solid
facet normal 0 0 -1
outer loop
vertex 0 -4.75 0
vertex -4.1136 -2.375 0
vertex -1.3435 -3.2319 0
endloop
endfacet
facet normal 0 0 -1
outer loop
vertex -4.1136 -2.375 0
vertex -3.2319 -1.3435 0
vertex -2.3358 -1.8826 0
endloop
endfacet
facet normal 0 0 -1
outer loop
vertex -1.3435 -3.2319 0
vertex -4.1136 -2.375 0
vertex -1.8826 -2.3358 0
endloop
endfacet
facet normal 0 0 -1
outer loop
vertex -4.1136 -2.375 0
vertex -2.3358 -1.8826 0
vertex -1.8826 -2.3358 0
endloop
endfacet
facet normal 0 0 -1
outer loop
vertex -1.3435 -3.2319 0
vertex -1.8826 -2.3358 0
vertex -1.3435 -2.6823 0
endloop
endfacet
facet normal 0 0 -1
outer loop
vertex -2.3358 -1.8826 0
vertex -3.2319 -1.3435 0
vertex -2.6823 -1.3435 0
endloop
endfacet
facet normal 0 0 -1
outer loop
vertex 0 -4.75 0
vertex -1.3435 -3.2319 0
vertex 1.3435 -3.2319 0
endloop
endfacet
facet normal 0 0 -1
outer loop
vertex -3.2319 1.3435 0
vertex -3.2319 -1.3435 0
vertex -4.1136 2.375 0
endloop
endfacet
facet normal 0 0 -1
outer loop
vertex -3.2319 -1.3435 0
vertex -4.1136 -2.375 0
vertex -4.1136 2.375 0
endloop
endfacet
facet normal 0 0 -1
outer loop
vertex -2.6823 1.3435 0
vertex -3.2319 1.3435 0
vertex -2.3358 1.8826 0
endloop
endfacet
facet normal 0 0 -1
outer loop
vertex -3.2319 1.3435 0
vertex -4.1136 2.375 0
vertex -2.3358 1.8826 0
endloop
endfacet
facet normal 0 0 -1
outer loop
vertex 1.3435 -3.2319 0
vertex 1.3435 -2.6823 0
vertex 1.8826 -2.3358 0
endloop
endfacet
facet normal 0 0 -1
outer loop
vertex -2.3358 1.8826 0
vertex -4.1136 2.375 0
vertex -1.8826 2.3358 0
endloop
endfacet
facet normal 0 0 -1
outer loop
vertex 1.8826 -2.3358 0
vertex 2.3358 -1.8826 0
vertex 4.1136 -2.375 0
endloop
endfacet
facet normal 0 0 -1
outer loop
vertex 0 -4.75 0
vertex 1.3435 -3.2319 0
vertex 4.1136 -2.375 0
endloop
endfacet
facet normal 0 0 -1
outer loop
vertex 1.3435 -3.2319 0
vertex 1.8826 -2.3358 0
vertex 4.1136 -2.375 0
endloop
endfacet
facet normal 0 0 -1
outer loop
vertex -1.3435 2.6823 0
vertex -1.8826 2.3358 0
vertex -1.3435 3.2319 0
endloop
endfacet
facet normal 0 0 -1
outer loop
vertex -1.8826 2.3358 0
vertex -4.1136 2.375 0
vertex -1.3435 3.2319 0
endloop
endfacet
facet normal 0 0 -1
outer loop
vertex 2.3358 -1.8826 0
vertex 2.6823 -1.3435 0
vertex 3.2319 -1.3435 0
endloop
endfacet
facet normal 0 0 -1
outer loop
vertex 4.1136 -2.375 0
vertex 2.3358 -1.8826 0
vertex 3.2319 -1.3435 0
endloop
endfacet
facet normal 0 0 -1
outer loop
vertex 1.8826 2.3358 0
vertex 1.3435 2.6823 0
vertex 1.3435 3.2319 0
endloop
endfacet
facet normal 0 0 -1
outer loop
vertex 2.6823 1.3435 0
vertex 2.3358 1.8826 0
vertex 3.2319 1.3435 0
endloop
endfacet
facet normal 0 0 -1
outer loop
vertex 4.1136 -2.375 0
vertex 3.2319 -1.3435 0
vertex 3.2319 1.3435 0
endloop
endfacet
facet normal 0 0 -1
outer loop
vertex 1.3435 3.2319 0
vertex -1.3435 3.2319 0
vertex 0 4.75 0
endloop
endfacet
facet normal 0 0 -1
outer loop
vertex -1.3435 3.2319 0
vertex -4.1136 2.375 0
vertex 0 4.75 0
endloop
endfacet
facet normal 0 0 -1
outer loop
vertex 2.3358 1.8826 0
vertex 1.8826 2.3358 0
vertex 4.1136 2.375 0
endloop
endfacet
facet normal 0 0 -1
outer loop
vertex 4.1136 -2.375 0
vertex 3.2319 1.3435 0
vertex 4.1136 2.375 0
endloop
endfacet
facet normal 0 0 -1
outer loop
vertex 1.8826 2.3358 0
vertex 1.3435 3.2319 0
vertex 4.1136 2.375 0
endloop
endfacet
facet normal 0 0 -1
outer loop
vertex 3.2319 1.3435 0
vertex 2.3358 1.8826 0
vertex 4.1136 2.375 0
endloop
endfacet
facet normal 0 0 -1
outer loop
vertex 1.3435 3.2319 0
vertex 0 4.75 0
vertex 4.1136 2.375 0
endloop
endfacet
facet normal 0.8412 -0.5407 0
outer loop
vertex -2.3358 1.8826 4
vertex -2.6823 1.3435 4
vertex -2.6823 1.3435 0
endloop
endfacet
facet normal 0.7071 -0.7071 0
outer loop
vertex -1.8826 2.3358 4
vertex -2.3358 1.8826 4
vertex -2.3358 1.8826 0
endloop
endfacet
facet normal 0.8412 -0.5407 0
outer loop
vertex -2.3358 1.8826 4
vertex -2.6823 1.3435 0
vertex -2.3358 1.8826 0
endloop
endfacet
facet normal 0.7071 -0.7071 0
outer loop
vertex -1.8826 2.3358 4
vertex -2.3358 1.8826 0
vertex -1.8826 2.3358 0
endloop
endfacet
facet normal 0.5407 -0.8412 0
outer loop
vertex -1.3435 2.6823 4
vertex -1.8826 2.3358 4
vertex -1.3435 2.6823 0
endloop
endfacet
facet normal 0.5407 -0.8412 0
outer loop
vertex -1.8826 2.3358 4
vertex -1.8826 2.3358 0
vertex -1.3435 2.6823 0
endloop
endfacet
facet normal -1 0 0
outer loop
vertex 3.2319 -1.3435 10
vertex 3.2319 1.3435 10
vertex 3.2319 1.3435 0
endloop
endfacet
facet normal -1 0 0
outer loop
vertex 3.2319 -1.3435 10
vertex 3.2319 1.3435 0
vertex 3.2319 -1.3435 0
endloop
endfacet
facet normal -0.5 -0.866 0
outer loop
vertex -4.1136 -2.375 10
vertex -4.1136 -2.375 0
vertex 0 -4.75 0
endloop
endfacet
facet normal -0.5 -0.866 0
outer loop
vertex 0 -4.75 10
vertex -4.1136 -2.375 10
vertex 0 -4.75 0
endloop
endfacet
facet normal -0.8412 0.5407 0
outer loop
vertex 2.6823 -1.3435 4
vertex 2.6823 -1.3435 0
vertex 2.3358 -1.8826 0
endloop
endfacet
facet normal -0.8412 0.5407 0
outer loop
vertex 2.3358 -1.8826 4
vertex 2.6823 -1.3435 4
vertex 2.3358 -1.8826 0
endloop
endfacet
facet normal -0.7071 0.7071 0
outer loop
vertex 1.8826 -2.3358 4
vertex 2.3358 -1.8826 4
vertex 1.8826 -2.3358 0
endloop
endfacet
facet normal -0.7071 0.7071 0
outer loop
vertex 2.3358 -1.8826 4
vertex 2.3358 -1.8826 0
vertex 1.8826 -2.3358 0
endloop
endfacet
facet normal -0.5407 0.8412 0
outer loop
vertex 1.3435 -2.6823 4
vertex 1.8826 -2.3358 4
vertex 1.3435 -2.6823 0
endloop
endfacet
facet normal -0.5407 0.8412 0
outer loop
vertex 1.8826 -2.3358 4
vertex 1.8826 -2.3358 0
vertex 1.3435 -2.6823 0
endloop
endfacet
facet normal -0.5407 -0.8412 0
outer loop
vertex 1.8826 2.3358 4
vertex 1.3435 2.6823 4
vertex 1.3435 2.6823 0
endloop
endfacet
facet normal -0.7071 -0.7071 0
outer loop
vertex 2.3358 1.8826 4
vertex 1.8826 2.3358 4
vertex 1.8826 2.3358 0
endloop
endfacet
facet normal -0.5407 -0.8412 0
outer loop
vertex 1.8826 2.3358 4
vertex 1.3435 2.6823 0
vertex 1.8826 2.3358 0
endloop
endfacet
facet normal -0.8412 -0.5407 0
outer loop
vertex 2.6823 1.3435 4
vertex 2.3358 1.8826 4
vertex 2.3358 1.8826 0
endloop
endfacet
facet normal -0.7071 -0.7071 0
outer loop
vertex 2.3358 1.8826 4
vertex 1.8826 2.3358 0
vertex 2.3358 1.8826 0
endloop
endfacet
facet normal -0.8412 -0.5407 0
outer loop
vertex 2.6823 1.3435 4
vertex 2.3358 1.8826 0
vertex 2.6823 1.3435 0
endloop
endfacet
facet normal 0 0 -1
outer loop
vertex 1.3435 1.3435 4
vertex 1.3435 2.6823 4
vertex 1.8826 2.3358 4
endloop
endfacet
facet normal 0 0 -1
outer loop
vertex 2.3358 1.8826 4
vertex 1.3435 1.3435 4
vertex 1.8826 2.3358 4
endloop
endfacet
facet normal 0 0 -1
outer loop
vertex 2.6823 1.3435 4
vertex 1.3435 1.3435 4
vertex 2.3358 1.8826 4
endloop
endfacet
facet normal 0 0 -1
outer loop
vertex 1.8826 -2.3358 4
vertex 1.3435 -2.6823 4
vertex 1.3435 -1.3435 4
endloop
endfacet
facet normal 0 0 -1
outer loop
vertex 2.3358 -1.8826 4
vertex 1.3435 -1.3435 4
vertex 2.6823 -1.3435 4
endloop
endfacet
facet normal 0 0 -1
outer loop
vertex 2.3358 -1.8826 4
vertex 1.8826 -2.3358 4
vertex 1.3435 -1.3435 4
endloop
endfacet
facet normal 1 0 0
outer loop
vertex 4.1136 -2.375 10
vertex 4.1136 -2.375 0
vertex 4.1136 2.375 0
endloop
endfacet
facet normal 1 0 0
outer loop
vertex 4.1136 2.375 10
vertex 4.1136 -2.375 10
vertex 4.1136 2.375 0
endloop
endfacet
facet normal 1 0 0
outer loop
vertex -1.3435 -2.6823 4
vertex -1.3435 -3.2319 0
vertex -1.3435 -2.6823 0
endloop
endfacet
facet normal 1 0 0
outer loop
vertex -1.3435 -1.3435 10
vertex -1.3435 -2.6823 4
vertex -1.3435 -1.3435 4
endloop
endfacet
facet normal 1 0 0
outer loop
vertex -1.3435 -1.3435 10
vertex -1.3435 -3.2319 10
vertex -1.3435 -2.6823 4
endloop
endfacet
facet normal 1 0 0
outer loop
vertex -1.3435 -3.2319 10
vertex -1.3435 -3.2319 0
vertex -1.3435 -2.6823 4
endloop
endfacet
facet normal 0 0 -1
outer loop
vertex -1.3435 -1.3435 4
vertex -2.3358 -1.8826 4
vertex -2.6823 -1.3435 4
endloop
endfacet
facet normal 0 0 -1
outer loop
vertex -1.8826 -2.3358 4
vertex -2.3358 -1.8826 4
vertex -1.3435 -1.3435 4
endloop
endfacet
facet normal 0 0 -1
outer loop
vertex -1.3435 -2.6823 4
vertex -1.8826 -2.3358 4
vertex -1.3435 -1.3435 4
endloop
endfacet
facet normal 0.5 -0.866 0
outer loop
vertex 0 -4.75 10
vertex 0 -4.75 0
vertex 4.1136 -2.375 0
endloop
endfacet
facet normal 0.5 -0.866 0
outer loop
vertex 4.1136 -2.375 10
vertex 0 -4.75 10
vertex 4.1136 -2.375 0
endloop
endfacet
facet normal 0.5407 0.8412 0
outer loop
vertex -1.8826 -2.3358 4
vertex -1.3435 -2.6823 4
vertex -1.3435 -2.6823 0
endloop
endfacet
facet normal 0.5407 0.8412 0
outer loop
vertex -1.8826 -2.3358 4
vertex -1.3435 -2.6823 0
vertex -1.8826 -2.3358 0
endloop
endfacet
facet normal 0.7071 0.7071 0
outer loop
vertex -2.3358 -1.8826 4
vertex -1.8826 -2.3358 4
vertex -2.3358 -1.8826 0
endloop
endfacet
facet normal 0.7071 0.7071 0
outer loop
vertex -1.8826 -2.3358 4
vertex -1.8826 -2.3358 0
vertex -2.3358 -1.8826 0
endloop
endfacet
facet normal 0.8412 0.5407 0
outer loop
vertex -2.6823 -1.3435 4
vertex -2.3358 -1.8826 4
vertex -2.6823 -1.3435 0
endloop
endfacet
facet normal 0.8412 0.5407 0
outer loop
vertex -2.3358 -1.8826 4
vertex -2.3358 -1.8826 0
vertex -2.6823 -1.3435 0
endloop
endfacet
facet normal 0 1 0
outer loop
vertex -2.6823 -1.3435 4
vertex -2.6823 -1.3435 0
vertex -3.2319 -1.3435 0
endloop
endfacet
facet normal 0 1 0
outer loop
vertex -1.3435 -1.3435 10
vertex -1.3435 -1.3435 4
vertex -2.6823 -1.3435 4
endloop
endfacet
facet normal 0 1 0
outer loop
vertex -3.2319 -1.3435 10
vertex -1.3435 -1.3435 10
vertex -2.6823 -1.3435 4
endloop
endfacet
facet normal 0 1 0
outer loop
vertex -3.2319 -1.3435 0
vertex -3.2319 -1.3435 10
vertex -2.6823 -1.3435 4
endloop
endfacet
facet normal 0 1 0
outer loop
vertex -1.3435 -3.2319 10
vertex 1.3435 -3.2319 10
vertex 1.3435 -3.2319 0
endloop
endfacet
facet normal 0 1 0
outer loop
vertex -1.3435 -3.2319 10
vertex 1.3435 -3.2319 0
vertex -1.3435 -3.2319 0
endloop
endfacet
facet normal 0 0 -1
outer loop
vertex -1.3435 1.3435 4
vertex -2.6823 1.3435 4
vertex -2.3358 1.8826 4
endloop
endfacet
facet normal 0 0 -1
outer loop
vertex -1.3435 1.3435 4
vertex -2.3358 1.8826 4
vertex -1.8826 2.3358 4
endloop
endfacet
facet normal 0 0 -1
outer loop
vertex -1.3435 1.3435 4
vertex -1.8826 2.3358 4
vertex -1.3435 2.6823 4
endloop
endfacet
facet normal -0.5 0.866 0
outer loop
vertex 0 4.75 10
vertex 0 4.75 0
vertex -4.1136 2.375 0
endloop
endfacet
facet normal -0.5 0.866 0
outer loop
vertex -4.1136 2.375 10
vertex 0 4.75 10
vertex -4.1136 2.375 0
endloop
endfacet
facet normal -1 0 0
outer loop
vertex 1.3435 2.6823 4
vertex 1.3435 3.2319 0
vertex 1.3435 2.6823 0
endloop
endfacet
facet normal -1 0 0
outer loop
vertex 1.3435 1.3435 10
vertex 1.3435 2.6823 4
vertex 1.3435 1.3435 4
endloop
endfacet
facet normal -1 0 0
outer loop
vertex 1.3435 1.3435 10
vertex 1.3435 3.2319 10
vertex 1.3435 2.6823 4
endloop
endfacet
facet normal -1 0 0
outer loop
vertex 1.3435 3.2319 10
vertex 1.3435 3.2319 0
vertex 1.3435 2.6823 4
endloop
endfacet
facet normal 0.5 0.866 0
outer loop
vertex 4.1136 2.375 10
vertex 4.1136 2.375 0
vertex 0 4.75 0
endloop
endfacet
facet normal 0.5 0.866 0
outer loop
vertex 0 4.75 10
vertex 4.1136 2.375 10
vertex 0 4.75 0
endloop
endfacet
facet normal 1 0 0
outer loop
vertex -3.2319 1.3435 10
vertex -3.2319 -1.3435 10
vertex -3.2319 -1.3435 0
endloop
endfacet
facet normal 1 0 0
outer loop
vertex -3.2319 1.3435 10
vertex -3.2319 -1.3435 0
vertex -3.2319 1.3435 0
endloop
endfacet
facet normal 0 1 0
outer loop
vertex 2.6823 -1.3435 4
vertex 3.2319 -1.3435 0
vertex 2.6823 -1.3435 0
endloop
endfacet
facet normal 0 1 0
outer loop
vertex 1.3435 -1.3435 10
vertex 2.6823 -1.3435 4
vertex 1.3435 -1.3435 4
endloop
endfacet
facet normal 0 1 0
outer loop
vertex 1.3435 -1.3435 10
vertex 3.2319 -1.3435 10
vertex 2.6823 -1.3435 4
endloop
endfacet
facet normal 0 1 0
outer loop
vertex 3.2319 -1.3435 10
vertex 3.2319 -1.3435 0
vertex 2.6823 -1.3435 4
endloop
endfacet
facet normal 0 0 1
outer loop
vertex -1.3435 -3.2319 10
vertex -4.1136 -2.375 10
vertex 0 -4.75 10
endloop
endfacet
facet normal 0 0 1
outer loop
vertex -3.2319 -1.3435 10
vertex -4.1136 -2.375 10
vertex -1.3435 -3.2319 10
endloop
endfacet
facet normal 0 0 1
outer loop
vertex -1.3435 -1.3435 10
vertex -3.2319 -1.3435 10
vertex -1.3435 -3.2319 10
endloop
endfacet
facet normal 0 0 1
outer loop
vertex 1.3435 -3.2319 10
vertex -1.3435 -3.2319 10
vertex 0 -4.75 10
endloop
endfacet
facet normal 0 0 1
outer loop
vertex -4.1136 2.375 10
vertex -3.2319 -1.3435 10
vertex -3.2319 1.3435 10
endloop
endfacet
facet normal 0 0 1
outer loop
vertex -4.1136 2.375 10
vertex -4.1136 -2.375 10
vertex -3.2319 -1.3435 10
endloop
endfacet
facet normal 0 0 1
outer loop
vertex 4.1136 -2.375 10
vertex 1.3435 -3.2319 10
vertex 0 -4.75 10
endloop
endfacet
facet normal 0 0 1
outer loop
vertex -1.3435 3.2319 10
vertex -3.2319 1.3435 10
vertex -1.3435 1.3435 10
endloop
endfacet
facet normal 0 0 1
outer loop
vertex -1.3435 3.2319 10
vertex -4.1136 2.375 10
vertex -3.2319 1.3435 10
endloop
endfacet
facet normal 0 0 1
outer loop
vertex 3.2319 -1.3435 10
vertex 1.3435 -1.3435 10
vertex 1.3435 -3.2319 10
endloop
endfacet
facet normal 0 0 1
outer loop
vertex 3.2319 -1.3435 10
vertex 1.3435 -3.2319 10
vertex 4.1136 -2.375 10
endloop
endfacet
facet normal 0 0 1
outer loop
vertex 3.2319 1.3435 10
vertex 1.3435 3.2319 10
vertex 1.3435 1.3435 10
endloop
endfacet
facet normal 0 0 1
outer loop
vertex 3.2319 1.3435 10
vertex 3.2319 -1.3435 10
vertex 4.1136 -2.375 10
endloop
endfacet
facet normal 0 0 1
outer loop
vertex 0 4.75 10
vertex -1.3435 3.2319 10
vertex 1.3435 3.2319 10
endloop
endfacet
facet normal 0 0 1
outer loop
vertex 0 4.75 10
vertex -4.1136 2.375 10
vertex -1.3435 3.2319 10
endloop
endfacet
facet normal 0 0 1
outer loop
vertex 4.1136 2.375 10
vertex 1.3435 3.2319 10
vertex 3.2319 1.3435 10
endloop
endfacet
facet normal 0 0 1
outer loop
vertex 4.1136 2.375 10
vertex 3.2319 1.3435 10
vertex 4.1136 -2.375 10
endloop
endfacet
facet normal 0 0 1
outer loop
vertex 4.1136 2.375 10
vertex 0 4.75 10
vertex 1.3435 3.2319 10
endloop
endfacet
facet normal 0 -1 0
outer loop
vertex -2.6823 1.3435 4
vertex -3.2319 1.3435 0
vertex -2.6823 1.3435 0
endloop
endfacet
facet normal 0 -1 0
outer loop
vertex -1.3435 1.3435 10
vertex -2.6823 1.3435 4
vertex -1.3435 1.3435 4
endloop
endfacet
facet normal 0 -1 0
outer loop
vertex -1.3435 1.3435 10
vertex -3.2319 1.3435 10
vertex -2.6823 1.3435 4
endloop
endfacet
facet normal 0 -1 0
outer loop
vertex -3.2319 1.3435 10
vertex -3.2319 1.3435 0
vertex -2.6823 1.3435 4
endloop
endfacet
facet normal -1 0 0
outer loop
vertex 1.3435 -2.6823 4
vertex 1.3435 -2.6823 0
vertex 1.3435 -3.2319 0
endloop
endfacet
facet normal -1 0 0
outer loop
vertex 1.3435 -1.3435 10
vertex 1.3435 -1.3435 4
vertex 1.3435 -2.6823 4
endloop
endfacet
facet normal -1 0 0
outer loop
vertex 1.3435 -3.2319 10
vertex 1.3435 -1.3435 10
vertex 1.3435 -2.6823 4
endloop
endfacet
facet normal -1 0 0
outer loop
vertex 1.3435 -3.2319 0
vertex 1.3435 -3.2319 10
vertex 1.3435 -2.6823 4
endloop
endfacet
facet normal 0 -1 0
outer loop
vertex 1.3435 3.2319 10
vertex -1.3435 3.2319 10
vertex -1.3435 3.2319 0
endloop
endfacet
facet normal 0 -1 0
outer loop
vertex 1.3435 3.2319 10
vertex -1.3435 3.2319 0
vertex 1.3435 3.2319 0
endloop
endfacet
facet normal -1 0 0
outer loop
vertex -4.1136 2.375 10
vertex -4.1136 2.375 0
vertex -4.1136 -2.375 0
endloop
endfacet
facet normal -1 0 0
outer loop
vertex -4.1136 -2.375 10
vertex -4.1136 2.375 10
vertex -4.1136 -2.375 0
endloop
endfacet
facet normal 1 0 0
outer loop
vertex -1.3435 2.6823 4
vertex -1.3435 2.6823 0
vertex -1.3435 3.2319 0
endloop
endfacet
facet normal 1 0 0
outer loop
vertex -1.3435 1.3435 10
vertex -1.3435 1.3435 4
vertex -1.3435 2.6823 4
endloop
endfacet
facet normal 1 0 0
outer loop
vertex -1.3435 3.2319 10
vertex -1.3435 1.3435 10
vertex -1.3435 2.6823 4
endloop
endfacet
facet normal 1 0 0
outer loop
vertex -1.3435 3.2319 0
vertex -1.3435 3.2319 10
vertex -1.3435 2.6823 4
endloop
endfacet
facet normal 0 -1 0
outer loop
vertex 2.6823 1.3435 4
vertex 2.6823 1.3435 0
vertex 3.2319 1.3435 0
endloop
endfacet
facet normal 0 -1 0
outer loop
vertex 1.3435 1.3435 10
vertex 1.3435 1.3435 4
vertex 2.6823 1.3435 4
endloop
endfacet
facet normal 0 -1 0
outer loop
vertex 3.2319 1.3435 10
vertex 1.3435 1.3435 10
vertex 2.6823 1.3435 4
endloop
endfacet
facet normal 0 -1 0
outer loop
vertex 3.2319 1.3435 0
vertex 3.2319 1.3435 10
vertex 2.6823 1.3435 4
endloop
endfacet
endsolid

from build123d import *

# Parameters (mm, degrees)
PAD023_DEPTH    = 10
POCKET011_DEPTH = 10
SKETCH038_R     = 3
POCKET012_DEPTH = 4


with BuildPart() as part:
    # Sketch036 → Pad023 (new body)
    with BuildSketch(Plane.XY):
        Polygon((4.113621, -2.375), (4.113621, 2.375), (0, 4.75), (-4.113621, 2.375), (-4.113621, -2.375), (0, -4.75), align=None)
    extrude(amount=PAD023_DEPTH)

    # Sketch037 (on Face8 of Pad023) → Pocket011 (cut)
    with BuildSketch(Plane.XY.offset(10)):
        Polygon((-3.231873, -1.343503), (-3.231873, 1.343503), (-1.343503, 1.343503), (-1.343503, 3.231873), (1.343503, 3.231873), (1.343503, 1.343503), (3.231873, 1.343503), (3.231873, -1.343503), (1.343503, -1.343503), (1.343503, -3.231873), (-1.343503, -3.231873), (-1.343503, -1.343503), align=None)
    extrude(amount=-POCKET011_DEPTH, mode=Mode.SUBTRACT)

    # Sketch038 (on Face4 of Pocket011) → Pocket012 (cut)
    with BuildSketch(Plane(origin=(0, 0, 0), x_dir=(1, 0, 0), z_dir=(0, 0, -1))):
        Circle(SKETCH038_R)
    extrude(amount=-POCKET012_DEPTH, mode=Mode.SUBTRACT)


solid = part.part
